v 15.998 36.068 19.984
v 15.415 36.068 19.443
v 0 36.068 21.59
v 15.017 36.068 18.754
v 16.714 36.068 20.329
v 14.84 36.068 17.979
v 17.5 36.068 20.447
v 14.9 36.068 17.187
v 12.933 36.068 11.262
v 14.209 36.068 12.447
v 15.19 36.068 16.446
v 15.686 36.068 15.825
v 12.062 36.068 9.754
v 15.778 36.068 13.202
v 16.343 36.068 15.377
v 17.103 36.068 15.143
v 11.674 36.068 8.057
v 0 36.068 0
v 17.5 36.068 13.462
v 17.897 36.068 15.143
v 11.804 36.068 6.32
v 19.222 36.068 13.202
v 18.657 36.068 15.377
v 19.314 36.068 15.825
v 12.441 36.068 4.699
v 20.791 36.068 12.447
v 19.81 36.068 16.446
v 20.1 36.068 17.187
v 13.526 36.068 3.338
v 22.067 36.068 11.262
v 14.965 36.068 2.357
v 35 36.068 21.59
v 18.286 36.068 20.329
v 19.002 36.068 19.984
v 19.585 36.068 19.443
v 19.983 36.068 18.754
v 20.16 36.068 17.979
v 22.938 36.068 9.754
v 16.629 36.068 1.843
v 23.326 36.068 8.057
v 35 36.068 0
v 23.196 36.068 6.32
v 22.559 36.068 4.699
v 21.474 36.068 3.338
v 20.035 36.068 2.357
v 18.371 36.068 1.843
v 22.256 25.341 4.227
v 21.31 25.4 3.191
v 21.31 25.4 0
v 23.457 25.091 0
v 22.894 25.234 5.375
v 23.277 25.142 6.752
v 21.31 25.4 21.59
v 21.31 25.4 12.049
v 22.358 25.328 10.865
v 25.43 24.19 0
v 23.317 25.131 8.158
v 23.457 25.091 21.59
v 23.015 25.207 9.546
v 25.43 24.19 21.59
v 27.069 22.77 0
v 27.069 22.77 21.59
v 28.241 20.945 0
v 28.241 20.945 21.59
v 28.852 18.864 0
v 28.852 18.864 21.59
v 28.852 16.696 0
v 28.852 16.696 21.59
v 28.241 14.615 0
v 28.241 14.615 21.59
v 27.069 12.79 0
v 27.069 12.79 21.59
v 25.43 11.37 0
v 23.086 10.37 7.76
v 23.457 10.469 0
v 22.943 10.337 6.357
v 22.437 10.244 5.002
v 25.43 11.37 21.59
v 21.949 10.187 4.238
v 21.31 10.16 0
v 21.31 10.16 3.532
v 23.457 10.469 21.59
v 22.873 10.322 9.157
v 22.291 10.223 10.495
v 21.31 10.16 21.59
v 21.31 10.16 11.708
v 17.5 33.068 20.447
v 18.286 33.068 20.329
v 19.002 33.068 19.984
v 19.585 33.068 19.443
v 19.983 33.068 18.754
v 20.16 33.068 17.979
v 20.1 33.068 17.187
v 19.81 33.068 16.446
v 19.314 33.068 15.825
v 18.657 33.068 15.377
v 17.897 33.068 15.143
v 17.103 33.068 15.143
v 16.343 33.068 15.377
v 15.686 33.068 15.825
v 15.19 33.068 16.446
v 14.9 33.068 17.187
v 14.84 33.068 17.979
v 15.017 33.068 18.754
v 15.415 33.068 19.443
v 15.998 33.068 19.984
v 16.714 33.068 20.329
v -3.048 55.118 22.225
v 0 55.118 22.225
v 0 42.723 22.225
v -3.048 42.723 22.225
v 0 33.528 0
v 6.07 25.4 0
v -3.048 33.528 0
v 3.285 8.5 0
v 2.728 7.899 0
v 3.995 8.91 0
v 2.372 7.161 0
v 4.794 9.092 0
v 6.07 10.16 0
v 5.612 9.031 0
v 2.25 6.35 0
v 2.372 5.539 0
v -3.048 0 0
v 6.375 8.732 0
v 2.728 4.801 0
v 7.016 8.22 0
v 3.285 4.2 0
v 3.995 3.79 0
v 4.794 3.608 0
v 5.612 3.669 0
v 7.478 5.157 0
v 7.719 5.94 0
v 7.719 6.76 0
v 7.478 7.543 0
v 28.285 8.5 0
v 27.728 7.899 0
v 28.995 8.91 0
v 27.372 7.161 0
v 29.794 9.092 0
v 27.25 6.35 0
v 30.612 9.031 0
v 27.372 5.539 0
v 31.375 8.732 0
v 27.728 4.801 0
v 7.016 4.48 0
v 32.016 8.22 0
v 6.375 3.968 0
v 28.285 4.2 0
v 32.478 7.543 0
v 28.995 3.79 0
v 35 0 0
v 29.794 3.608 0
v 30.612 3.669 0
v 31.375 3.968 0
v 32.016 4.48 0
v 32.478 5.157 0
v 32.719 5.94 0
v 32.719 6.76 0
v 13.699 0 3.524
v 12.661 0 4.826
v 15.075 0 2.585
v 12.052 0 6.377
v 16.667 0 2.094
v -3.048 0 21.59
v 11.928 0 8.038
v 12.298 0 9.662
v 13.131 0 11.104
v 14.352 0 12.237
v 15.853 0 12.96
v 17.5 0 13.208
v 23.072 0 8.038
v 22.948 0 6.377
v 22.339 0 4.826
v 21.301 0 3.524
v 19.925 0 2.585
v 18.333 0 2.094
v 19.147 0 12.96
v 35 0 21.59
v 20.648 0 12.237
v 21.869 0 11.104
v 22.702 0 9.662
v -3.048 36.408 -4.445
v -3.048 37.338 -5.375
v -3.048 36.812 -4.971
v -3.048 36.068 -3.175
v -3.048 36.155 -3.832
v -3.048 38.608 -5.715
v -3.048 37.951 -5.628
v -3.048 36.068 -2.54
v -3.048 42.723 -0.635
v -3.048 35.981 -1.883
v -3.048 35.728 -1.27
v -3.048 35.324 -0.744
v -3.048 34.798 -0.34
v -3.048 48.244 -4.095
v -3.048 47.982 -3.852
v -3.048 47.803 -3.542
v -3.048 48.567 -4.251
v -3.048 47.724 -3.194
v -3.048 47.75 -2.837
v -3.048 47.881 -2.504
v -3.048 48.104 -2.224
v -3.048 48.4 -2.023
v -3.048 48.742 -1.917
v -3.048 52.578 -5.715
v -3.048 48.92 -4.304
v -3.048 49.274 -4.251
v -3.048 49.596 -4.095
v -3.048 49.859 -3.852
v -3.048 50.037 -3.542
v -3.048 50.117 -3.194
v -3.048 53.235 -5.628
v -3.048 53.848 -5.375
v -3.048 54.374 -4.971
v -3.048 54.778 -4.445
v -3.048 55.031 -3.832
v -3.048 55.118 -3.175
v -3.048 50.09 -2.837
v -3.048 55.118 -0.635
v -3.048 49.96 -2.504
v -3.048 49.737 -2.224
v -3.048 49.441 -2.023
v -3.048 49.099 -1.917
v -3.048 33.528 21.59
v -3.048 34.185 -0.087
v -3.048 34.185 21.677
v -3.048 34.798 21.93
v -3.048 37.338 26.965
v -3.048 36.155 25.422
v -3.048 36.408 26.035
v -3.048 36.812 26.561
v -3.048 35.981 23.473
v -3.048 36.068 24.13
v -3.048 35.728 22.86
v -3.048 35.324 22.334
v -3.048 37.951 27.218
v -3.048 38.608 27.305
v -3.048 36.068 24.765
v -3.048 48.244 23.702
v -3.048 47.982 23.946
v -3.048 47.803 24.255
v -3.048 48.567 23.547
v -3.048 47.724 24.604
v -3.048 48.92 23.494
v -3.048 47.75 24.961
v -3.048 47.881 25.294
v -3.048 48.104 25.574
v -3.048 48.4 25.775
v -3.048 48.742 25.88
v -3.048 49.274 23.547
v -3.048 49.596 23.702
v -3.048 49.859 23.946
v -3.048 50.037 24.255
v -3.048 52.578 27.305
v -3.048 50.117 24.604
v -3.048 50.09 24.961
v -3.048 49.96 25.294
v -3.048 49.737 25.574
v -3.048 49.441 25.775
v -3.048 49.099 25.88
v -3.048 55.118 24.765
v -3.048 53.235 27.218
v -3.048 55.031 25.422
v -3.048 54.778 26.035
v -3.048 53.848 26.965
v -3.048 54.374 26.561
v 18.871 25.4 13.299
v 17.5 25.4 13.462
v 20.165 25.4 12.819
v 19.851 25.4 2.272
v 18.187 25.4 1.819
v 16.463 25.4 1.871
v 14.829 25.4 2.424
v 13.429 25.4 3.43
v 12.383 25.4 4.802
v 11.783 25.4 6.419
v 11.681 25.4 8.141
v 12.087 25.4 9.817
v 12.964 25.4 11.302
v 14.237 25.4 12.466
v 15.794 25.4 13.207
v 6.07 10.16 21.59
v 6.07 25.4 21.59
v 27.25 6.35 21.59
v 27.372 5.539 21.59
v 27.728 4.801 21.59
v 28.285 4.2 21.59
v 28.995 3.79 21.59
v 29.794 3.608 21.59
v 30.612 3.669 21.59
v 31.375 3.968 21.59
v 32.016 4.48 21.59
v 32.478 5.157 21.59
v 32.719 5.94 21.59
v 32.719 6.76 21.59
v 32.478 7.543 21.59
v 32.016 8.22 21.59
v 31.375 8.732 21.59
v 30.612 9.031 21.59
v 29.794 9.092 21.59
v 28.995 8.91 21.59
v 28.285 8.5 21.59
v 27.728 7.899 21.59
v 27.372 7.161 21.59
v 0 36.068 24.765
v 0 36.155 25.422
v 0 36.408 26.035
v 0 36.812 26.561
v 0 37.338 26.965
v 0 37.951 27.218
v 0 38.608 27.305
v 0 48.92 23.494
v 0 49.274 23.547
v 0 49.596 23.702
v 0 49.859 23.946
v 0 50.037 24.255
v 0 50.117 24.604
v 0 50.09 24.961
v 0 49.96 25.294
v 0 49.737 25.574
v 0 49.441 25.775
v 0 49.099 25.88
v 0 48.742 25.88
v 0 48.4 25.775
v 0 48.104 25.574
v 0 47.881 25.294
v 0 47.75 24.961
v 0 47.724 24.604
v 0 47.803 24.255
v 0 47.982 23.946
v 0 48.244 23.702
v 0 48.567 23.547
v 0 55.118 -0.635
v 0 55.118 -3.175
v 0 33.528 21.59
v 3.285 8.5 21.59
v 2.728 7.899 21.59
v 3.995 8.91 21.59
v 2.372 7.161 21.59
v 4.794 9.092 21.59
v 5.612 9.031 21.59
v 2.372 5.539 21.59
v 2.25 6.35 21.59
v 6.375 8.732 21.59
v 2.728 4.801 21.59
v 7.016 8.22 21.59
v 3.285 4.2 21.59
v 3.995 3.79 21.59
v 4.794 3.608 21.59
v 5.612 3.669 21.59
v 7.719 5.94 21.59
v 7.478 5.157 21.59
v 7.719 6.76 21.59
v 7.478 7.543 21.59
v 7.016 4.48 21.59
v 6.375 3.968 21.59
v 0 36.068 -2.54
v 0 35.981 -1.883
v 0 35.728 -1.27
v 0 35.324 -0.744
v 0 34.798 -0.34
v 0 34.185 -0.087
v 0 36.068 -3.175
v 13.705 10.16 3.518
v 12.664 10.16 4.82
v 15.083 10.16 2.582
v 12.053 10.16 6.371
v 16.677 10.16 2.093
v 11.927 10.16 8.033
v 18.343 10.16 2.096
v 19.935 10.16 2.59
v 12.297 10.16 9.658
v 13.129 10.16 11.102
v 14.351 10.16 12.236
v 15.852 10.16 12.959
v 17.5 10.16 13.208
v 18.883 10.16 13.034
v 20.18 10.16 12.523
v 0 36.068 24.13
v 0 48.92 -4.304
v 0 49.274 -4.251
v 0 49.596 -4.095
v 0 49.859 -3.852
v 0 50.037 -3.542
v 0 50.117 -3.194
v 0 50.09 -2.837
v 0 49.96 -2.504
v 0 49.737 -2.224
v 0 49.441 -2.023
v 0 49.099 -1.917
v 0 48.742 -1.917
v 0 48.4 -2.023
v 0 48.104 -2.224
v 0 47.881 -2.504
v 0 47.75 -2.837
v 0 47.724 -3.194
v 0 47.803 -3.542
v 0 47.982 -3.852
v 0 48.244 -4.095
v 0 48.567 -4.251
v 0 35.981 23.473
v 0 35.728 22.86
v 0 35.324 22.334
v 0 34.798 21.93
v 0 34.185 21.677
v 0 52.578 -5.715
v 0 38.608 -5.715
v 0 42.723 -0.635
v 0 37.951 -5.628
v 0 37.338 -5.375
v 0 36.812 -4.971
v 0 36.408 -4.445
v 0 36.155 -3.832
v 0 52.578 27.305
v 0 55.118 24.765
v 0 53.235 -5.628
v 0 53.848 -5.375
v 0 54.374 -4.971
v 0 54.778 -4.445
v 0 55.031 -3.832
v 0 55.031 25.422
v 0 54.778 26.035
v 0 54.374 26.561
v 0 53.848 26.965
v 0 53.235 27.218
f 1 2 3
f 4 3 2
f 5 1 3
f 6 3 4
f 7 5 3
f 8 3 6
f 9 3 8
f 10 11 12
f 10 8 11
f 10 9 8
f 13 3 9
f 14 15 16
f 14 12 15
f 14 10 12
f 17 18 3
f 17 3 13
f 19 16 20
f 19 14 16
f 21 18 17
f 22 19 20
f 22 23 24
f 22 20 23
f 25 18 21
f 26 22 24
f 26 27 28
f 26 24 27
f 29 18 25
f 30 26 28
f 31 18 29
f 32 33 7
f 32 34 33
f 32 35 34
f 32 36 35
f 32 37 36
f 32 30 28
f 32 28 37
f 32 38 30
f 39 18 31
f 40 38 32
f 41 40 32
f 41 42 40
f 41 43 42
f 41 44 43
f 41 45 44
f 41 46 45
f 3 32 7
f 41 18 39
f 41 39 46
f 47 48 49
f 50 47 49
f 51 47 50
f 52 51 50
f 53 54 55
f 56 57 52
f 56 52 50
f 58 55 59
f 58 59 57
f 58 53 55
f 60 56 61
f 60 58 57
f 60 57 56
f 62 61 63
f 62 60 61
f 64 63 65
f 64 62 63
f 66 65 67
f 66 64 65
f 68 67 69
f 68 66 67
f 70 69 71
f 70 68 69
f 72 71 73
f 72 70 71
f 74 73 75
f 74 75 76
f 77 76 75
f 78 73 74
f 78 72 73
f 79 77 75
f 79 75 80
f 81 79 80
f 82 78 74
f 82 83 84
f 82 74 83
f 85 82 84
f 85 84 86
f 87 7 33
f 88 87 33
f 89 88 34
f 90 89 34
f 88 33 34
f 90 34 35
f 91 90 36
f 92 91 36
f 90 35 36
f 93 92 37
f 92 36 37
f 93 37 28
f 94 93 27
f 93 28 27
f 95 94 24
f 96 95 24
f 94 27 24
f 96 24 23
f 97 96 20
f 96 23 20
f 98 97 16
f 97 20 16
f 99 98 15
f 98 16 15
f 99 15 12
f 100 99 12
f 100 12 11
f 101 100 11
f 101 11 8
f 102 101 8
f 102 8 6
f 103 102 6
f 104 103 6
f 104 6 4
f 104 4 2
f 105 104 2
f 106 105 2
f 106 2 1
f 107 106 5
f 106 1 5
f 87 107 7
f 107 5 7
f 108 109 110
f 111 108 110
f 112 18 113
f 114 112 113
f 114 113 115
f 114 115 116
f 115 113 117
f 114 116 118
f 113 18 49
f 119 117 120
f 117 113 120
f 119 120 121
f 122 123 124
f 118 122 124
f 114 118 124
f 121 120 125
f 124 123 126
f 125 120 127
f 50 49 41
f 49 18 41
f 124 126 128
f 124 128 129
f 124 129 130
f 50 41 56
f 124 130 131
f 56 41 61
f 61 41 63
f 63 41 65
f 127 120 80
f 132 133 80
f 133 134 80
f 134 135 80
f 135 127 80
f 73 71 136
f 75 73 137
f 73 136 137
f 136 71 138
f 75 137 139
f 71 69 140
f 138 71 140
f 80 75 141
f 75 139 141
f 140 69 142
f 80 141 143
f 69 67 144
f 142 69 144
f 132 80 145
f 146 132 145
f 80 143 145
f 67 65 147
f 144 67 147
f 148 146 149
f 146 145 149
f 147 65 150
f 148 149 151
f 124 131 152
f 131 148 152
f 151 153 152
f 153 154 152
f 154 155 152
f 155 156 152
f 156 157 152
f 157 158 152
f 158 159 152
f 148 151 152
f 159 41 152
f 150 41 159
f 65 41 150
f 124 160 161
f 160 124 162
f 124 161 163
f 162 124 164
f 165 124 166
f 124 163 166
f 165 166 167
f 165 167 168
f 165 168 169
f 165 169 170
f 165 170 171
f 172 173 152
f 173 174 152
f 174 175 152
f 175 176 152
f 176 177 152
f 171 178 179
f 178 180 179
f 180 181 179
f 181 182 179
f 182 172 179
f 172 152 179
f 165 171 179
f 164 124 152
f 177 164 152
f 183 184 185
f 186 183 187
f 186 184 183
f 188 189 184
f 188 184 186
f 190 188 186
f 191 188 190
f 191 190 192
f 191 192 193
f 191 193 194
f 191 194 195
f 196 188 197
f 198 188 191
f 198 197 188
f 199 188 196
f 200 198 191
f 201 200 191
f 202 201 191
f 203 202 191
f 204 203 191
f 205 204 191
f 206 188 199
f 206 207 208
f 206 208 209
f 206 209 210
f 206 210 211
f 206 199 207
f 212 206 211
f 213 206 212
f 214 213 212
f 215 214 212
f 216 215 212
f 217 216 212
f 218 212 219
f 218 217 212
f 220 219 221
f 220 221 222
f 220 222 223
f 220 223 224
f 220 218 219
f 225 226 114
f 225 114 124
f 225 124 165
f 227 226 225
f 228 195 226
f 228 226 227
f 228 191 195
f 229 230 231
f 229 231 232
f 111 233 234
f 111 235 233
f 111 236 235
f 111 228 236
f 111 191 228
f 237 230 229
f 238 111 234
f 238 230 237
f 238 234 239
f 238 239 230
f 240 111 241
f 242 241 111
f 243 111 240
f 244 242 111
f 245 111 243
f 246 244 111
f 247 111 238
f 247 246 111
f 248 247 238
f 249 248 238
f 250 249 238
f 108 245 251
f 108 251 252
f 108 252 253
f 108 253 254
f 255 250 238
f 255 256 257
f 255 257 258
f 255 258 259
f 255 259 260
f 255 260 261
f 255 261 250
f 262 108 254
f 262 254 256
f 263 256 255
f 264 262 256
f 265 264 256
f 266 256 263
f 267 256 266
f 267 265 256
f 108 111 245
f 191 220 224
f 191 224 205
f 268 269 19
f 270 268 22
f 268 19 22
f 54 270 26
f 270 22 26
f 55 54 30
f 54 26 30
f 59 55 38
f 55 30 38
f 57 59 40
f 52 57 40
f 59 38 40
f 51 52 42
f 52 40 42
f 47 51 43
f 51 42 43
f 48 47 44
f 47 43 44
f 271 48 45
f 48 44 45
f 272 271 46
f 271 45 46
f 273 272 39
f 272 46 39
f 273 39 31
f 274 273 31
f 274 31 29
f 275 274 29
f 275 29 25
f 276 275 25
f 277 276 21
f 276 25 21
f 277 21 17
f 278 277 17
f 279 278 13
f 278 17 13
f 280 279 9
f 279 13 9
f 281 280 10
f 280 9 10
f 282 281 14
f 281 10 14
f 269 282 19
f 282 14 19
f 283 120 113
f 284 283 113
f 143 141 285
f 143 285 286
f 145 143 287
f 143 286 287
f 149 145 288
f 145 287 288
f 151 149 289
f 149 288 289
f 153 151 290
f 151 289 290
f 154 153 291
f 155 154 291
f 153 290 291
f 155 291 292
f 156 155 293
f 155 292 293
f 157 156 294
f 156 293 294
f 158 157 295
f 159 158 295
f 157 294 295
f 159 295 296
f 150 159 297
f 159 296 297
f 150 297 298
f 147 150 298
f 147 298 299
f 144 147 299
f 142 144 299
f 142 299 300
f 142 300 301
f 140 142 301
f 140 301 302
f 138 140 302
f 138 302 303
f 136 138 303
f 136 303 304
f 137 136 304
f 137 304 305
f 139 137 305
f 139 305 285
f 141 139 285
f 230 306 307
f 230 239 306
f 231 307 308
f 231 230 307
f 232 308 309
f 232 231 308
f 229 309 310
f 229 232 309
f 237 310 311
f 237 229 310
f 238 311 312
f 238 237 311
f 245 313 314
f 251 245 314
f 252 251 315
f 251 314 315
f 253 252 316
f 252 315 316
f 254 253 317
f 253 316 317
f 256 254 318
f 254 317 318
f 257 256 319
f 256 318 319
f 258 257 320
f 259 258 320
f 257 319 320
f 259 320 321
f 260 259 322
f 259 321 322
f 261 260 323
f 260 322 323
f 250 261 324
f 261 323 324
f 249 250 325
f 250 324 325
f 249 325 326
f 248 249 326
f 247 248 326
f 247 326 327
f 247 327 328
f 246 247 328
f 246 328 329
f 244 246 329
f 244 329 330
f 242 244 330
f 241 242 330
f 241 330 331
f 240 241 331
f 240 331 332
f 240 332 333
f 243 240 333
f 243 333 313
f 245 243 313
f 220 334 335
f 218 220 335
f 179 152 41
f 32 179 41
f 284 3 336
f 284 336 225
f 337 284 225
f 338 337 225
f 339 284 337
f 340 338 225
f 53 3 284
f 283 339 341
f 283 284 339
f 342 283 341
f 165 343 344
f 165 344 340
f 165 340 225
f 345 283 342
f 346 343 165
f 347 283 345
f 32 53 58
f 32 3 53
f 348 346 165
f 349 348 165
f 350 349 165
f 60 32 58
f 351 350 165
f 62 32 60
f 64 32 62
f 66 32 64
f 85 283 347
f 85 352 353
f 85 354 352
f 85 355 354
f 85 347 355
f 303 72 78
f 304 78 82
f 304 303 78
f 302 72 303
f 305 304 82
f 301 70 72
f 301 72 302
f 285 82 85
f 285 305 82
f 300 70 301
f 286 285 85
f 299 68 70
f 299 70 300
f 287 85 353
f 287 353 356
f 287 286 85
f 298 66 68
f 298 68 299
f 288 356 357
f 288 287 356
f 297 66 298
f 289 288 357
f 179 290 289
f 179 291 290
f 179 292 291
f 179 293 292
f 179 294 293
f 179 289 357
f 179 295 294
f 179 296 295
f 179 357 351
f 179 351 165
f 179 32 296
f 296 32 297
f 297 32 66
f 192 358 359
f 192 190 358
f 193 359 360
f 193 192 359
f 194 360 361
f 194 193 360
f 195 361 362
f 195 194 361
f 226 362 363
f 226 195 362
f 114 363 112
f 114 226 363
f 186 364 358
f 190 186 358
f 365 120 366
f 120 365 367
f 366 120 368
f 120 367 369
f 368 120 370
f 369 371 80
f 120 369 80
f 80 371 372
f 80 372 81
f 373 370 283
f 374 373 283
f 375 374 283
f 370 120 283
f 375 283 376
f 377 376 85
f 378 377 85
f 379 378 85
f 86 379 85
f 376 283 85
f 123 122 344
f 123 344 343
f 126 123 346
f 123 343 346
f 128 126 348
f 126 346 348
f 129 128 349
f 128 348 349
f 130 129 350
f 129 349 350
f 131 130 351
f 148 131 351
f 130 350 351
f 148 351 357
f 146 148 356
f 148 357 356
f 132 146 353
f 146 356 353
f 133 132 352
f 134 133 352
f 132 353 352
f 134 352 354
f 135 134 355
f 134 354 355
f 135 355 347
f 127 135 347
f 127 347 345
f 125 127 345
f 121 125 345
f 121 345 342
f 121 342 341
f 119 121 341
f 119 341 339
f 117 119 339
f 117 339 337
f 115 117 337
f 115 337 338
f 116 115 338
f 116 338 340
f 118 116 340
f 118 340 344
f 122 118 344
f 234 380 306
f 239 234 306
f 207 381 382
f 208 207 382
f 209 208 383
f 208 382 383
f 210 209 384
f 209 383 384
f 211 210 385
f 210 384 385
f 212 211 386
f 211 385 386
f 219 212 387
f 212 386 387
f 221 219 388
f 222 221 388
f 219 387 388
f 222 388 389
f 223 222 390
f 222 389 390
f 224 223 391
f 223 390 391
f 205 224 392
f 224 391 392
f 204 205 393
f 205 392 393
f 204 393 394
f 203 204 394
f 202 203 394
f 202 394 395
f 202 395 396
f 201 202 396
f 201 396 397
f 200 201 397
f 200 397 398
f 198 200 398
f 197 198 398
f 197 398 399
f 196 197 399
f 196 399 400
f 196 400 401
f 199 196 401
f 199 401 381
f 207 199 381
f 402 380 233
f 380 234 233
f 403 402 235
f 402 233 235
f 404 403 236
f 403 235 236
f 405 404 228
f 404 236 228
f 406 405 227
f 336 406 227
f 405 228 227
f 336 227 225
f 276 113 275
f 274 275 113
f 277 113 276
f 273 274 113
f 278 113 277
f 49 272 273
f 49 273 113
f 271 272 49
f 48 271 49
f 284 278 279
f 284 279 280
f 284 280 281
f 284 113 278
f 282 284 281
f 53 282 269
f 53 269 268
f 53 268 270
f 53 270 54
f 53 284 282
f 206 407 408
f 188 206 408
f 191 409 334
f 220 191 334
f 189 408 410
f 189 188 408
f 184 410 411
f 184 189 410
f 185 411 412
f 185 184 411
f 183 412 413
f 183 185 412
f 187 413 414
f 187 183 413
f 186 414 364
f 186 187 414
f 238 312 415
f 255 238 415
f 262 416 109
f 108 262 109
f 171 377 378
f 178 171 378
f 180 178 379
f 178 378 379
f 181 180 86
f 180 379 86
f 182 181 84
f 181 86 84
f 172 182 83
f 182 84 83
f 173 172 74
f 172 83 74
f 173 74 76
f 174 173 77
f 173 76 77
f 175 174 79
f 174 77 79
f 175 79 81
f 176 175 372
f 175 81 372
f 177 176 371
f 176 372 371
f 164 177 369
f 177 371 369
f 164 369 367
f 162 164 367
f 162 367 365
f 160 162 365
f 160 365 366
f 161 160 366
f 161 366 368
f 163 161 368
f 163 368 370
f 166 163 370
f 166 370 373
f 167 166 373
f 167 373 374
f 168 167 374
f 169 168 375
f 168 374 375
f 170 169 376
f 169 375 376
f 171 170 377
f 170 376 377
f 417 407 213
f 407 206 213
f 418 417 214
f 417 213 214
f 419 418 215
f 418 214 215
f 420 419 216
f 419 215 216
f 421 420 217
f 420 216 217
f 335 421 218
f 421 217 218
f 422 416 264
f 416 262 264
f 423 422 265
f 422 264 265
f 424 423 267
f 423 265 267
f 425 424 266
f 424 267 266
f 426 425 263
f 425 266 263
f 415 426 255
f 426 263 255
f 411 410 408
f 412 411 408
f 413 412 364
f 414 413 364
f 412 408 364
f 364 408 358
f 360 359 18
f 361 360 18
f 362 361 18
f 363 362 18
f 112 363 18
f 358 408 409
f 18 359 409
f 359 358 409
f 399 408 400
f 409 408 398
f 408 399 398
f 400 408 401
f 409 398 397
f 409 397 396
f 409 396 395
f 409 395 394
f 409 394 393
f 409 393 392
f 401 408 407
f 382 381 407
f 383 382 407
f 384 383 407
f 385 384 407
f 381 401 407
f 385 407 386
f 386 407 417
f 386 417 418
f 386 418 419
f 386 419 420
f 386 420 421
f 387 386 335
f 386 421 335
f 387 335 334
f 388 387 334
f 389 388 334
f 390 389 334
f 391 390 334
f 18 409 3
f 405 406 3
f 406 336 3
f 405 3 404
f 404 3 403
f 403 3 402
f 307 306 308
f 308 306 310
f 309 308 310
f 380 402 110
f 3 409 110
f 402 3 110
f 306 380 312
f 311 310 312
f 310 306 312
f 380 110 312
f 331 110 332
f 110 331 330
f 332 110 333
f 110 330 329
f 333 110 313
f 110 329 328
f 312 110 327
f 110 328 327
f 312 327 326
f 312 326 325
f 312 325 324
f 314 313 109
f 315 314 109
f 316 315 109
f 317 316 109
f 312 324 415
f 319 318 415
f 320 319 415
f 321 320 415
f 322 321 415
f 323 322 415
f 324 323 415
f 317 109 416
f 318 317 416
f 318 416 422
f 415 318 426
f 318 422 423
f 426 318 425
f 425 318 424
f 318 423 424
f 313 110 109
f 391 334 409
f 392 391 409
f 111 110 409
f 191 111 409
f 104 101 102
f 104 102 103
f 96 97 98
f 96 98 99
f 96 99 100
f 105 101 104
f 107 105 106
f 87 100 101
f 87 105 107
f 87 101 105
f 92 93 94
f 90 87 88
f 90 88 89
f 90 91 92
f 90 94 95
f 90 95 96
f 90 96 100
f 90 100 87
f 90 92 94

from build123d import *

# Parameters (mm, degrees)
SKETCH2_W            = 35
SKETCH2_H            = 36.068
BOSS_EXTRUDE1_DEPTH  = 21.59
M5_CLEARANCE_HOLE1_D = 5.5
SKETCH13_W           = 22.86
SKETCH13_H           = 15.24
CUT_EXTRUDE3_DEPTH   = 55.699439887
CUT_EXTRUDE1_REACH   = 56.699
SKETCH5_R            = 5.842
BOSS_EXTRUDE2_DEPTH  = 3.048
M2_CLEARANCE_HOLE1_D = 2.4
FILLET2_R            = 2.54
SKETCH11_R           = 2.667
CUT_EXTRUDE2_DEPTH   = 3
SKETCH14_R           = 5.588
CUT_EXTRUDE4_DEPTH   = 64.180572876
FILLET3_R            = 7.62


with BuildPart() as part:
    # Sketch2 → Boss-Extrude1 (new body)
    with BuildSketch(Plane.XY):
        with Locations((17.5, 18.034)):
            Rectangle(SKETCH2_W, SKETCH2_H)
    extrude(amount=BOSS_EXTRUDE1_DEPTH)

    # M5 Clearance Hole1 (through all)
    with Locations(Plane(origin=(0, 0, 0), x_dir=(1, 0, 0), z_dir=(0, 0, -1))):
        with Locations((5, -6.35), (30, -6.35)):
            Hole(M5_CLEARANCE_HOLE1_D / 2)

    # Sketch13 → Cut-Extrude3 (cut, through all)
    with BuildSketch(Plane.XY.offset(21.59)):
        with Locations((17.5, 17.78)):
            Rectangle(SKETCH13_W, SKETCH13_H)
    extrude(amount=-CUT_EXTRUDE3_DEPTH, mode=Mode.SUBTRACT)

    # Sketch5 → Cut-Extrude1 (cut, up to next)
    with BuildSketch(Plane(origin=(0, 36.068, 0), x_dir=(1, 0, 0), z_dir=(0, 1, 0)), mode=Mode.PRIVATE) as cut_extrude1_sk1:
        with Locations(Location((17.5, -7.62, 0), (0, 0, 270))):
            Circle(SKETCH5_R)
    cut_extrude1_tool1 = extrude(cut_extrude1_sk1.sketch, amount=-CUT_EXTRUDE1_REACH, mode=Mode.PRIVATE) & part.part
    add(cut_extrude1_tool1.solids().sort_by_distance((17.5, 36.068, 7.62))[0], mode=Mode.SUBTRACT)

    # Sketch7 → Boss-Extrude2 (add)
    with BuildSketch(Plane.ZY):
        Polygon((-5.715, 55.118), (-5.715, 36.068), (0, 36.068), (0, 0), (21.59, 0), (21.59, 36.068), (27.305, 36.068), (27.305, 55.118), (22.225, 55.118), (22.225, 42.7228), (-0.635, 42.7228), (-0.635, 55.118), align=None)
    extrude(amount=BOSS_EXTRUDE2_DEPTH)

    # M2 Clearance Hole1 (through all)
    with Locations(Plane.ZY.offset(3.048)):
        with Locations((-3.10388, 48.9204), (24.69388, 48.9204)):
            Hole(M2_CLEARANCE_HOLE1_D / 2)

    # Fillet2
    fillet2_edges = [part.edges().sort_by_distance(p)[0] for p in [
        (-1.524, 55.118, -5.715),
        (-1.524, 36.068, -5.715),
        (-1.524, 36.068, 0),
        (-1.524, 36.068, 21.59),
        (-1.524, 36.068, 27.305),
        (-1.524, 55.118, 27.305),
    ]]
    fillet(fillet2_edges, radius=FILLET2_R)

    # Sketch11 → Cut-Extrude2 (cut)
    with BuildSketch(Plane(origin=(0, 36.068, 0), x_dir=(1, 0, 0), z_dir=(0, 1, 0))):
        with Locations(Location((17.5, -17.78, 0), (0, 0, 270))):
            Circle(SKETCH11_R)
    extrude(amount=-CUT_EXTRUDE2_DEPTH, mode=Mode.SUBTRACT)

    # Sketch14 → Cut-Extrude4 (cut, through all)
    with BuildSketch(Plane(origin=(0, 10.16, 0), x_dir=(1, 0, 0), z_dir=(0, 1, 0))):
        with Locations(Location((17.5, -7.62, 0), (0, 0, 270))):
            Circle(SKETCH14_R)
    extrude(amount=-CUT_EXTRUDE4_DEPTH, mode=Mode.SUBTRACT)

    # Fillet3
    # the kernel refuses this fillet: 7.62 mm, written as the material it adds along each edge
    with BuildSketch(Plane(origin=(28.93, 25.4, 21.59), x_dir=(-1, 0, 0), z_dir=(0, 0, -1))) as fillet3_piece_1_section:
        with BuildLine():
            CenterArc((FILLET3_R, -FILLET3_R), FILLET3_R, 90, 90)
            Line((0, -FILLET3_R), (0, 0))
            Line((0, 0), (FILLET3_R, 0))
        make_face()
    fillet3_piece_1 = extrude(amount=21.59, mode=Mode.PRIVATE)
    fillet3_piece_1 = fillet3_piece_1 - Plane(origin=(17.5, 23.659865562, 7.62), x_dir=(0, 0, 1), z_dir=(0, 1, 0)) * Cylinder(5.842, 74, mode=Mode.PRIVATE)
    add(fillet3_piece_1)
    with BuildSketch(Plane(origin=(28.93, 10.16, 21.59), x_dir=(0, 1, 0), z_dir=(0, 0, -1))) as fillet3_piece_2_section:
        with BuildLine():
            CenterArc((FILLET3_R, -FILLET3_R), FILLET3_R, 90, 90)
            Line((0, -FILLET3_R), (0, 0))
            Line((0, 0), (FILLET3_R, 0))
        make_face()
    fillet3_piece_2 = extrude(amount=21.59, mode=Mode.PRIVATE)
    fillet3_piece_2 = fillet3_piece_2 - Plane(origin=(17.5, 11.896400625, 7.62), x_dir=(0, 0, 1), z_dir=(0, 1, 0)) * Cylinder(5.588, 74, mode=Mode.PRIVATE)
    add(fillet3_piece_2)


solid = part.part
